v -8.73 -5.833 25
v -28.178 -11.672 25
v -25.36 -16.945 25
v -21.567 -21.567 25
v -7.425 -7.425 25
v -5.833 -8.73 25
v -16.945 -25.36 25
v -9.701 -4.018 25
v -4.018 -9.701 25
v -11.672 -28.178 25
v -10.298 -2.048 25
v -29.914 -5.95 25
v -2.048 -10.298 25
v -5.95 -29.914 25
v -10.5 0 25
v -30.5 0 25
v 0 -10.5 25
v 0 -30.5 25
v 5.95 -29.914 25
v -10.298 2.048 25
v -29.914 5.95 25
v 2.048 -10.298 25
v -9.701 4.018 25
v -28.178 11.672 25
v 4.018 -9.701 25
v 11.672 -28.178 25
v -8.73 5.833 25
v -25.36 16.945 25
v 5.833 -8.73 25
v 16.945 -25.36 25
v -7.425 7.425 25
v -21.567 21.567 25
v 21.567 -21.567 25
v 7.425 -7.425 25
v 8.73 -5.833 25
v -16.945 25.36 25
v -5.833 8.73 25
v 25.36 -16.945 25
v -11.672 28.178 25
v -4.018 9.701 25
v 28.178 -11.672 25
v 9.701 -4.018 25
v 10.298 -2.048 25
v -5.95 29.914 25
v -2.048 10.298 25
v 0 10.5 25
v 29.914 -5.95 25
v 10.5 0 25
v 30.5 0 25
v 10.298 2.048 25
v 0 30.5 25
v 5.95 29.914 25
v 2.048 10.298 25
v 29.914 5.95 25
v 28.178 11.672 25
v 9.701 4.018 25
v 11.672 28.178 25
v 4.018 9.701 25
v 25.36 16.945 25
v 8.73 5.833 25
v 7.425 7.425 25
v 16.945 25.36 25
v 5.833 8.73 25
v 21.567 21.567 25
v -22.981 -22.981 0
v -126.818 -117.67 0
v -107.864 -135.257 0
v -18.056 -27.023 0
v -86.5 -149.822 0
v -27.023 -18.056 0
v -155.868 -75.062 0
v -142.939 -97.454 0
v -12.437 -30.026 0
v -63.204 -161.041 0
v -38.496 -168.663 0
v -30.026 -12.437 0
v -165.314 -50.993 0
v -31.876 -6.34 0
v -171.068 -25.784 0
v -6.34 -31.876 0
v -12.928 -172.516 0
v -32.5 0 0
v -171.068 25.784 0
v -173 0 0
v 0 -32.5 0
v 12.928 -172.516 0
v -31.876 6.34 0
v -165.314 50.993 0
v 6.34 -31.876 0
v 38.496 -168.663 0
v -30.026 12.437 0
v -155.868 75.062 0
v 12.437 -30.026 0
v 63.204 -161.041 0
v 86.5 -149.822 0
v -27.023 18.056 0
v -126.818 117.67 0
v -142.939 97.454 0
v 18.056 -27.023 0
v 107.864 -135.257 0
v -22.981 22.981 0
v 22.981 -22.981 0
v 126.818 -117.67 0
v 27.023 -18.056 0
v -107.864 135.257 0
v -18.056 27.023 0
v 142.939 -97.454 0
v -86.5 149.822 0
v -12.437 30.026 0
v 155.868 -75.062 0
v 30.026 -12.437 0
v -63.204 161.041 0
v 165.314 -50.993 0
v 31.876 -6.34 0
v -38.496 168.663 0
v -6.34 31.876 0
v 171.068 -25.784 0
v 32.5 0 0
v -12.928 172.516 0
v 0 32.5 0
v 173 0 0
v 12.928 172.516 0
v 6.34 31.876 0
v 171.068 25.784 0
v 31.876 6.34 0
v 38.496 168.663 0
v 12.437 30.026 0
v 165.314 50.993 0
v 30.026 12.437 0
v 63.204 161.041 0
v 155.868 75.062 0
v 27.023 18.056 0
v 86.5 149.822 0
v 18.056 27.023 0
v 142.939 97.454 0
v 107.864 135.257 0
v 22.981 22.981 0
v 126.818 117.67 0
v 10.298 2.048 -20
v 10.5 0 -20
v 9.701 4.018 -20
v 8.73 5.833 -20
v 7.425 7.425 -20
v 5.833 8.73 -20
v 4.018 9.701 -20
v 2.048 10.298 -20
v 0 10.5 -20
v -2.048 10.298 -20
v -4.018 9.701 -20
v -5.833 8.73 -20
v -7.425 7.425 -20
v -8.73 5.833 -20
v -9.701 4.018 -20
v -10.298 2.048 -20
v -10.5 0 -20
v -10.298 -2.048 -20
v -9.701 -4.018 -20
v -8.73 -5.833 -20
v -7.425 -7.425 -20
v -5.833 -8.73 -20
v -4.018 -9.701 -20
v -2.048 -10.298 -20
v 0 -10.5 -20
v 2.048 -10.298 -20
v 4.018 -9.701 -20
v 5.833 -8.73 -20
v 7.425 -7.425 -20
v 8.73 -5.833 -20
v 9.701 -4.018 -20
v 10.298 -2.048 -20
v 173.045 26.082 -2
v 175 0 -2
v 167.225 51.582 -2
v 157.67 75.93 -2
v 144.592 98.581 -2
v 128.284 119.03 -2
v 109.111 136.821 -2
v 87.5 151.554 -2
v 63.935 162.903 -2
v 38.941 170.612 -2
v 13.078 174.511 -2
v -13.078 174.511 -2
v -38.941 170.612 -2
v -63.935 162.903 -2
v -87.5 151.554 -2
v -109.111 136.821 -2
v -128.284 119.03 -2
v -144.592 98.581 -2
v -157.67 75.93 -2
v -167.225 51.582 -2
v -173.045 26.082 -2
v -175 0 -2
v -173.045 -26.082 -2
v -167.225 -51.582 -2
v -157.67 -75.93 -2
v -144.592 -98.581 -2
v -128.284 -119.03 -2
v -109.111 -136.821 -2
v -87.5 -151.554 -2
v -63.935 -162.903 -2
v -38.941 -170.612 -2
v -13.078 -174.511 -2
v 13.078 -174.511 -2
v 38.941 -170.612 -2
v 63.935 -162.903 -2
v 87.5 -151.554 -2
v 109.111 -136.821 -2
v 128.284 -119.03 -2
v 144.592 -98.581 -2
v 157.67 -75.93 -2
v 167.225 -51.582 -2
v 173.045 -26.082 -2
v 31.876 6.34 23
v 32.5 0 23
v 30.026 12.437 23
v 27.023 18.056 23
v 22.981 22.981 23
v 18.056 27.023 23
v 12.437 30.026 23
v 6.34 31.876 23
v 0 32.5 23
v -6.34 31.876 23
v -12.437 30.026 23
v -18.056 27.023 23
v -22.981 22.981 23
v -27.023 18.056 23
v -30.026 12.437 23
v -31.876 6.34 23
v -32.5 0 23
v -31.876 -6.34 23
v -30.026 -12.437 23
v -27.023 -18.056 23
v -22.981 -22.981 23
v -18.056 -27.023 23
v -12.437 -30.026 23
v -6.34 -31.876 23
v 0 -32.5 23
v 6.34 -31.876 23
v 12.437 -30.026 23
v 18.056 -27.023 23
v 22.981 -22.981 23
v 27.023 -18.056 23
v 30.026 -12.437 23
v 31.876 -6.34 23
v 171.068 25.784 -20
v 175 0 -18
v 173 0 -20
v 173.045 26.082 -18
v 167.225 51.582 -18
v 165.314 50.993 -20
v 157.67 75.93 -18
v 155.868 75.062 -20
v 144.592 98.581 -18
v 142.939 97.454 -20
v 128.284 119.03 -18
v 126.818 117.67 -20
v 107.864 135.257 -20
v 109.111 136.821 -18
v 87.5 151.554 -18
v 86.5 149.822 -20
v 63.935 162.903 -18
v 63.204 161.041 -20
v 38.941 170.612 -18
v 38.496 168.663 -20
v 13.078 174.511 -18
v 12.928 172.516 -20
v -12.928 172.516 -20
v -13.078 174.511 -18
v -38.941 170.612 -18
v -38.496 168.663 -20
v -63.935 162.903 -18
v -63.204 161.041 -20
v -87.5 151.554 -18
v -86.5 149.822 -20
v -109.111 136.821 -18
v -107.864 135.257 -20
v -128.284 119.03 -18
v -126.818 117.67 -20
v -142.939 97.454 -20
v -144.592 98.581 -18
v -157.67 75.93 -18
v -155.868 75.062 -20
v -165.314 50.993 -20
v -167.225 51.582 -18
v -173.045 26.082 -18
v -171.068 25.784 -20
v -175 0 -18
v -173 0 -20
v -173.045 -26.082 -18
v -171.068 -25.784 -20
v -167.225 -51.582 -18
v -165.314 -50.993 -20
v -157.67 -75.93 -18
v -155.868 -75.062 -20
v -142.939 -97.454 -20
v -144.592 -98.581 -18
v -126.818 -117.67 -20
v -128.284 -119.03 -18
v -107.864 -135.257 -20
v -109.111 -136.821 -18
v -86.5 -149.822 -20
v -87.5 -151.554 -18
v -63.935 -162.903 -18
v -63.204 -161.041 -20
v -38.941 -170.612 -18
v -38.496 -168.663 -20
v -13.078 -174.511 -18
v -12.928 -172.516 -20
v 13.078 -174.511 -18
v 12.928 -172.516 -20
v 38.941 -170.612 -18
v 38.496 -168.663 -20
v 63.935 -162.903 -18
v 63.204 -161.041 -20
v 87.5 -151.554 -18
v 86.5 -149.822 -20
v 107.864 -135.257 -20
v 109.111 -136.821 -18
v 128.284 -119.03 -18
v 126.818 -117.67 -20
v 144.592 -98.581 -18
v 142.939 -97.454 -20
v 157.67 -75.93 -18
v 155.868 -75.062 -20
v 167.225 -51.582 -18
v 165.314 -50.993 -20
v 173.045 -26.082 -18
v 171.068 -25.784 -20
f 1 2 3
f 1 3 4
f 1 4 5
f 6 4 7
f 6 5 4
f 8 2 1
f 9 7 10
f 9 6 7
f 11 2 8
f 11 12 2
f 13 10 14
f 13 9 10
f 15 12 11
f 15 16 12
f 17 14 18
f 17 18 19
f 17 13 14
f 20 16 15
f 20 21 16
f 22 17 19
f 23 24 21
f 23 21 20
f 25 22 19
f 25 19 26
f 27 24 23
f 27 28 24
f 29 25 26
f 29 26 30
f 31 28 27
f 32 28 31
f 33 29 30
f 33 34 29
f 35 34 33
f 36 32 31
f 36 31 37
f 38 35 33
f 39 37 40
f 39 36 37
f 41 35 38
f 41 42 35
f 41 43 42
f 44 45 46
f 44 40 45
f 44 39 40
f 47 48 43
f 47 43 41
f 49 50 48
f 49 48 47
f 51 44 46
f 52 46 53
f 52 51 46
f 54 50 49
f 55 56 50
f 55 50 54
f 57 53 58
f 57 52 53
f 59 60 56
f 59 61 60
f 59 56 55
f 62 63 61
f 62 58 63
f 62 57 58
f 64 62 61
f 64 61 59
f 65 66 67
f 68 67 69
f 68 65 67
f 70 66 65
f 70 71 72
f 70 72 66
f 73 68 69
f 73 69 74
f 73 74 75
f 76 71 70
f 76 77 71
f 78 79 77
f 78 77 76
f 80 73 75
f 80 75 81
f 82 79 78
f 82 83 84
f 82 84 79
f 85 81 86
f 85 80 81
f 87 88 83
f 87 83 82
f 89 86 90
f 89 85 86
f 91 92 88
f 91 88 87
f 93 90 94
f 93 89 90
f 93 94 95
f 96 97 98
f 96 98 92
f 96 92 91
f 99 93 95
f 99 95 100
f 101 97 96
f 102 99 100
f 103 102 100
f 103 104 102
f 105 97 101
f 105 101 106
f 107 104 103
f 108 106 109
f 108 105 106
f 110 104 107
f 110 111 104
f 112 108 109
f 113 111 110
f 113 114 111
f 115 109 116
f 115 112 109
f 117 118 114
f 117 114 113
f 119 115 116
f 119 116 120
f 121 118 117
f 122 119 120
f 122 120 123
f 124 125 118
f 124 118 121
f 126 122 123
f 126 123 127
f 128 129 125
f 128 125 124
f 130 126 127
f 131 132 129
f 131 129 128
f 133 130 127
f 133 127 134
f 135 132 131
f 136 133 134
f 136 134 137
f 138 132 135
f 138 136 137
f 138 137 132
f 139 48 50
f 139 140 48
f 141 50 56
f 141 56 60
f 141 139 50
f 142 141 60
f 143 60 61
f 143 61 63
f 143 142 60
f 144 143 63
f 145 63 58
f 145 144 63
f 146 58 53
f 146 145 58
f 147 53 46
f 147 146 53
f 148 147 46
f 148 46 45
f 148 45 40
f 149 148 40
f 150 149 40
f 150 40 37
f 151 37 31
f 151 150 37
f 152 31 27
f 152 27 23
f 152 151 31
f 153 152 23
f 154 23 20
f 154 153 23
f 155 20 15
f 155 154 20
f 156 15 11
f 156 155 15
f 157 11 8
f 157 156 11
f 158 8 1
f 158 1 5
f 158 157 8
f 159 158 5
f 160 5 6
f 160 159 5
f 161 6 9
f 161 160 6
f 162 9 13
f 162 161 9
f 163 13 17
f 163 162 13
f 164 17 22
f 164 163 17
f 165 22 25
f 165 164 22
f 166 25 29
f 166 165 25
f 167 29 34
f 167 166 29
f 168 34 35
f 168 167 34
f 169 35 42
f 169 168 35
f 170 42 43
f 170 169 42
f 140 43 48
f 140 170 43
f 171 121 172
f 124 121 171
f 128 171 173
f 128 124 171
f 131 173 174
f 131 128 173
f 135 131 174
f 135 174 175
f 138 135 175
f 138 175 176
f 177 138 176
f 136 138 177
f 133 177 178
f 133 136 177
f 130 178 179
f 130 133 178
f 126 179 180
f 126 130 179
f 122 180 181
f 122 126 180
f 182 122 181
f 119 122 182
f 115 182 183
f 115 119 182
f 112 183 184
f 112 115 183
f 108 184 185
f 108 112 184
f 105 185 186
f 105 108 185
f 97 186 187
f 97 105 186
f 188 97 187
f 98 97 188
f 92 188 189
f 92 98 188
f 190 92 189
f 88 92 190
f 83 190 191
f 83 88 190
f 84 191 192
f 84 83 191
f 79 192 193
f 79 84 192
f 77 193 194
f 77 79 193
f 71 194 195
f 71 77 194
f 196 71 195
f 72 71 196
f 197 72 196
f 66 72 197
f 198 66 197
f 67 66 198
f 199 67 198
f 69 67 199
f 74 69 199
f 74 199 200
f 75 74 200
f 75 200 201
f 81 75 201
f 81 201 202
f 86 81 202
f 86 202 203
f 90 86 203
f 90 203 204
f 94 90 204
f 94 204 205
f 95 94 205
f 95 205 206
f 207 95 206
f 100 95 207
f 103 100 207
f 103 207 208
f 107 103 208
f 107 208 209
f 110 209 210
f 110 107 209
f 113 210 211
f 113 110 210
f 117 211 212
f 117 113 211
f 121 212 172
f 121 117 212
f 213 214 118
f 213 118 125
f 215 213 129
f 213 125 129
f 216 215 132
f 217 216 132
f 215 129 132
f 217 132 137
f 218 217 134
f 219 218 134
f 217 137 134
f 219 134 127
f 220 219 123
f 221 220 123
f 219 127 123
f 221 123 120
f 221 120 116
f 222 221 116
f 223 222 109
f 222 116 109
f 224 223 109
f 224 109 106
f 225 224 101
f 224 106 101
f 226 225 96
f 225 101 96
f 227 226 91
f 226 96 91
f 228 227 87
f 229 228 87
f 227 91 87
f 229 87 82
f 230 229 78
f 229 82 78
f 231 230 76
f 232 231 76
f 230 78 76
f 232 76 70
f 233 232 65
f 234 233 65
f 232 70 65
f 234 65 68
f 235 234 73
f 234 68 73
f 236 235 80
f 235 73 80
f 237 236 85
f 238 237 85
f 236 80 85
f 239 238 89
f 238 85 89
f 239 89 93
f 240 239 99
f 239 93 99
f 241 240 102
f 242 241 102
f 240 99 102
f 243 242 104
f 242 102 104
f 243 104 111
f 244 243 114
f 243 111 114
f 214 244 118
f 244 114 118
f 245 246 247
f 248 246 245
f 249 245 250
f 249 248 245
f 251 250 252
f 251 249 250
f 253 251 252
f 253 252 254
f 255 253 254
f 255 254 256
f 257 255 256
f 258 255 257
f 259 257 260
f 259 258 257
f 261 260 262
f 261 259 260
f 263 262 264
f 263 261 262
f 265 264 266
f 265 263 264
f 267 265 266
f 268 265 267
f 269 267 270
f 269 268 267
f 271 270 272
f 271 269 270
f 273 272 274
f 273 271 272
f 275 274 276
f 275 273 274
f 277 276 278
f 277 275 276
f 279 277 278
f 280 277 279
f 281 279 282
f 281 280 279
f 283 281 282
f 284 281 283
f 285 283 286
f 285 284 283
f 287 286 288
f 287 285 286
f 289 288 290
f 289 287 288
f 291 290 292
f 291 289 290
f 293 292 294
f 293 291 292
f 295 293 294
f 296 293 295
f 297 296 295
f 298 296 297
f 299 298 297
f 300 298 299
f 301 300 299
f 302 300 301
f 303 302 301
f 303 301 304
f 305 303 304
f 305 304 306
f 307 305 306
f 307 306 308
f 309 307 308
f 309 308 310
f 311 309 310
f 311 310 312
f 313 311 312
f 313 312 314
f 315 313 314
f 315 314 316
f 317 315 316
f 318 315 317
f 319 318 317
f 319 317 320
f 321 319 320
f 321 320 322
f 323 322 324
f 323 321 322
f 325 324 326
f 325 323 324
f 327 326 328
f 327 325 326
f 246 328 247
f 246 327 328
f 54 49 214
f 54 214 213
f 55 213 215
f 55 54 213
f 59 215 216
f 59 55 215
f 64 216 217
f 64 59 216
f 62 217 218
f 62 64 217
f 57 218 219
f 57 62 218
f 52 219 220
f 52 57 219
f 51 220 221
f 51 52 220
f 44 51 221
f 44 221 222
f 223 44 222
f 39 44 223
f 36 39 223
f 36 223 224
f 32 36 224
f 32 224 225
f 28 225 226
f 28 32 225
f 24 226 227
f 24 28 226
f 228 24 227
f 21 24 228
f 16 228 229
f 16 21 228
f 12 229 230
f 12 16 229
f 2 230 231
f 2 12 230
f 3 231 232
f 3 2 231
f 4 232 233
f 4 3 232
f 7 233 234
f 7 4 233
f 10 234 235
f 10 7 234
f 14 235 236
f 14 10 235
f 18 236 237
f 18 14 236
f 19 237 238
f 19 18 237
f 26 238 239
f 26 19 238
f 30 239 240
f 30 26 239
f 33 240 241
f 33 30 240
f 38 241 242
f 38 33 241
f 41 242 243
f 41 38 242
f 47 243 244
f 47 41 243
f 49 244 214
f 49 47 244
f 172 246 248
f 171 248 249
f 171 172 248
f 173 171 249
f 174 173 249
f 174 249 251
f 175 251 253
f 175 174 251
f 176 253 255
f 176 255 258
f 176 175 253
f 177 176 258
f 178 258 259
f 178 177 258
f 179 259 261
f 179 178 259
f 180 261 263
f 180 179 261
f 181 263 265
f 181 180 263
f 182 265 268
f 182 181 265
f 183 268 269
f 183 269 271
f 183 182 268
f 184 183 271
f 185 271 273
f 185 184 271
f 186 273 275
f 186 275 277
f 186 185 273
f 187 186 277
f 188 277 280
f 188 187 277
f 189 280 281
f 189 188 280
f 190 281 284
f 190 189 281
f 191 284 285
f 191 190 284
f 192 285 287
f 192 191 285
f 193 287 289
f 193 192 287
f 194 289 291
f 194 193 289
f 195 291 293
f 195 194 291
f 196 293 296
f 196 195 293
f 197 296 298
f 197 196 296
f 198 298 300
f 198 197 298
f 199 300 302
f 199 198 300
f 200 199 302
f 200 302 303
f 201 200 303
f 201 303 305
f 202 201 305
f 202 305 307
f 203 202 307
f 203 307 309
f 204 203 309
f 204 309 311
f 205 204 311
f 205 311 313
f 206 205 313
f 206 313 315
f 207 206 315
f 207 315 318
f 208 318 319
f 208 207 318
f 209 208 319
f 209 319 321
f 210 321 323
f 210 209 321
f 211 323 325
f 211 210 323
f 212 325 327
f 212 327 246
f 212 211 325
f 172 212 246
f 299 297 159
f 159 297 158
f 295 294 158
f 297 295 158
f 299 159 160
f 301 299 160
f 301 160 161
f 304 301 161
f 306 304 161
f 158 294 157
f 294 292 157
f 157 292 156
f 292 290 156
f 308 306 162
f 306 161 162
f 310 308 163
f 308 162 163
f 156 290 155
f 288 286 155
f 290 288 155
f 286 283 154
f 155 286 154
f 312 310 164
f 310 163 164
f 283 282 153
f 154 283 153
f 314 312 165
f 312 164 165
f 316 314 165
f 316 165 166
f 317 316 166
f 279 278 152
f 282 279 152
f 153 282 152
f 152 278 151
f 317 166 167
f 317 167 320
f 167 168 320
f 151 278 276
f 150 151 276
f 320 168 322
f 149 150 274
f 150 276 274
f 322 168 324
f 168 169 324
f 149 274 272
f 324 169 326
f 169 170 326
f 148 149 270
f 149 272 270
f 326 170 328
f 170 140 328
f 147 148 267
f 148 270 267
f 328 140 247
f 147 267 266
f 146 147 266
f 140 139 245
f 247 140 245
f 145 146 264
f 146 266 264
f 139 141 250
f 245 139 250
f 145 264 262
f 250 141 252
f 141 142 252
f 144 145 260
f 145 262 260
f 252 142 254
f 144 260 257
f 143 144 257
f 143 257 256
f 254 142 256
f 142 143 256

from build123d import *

# Parameters (mm, degrees)
F0_R     = 175
F0_R_2   = 32.5
F0_R_3   = 10.5
F1_DEPTH = 20
F2_DEPTH = 25
F3_SIZE  = 2


with BuildPart() as f1:
    # F0 (on Top) → F1 (new body)
    with BuildSketch(Plane.XY):
        Circle(F0_R)
        Circle(F0_R_2, mode=Mode.SUBTRACT)
        Circle(F0_R_2)
        Circle(F0_R_3, mode=Mode.SUBTRACT)
    extrude(amount=-F1_DEPTH)

    # F0 (on Top) → F2 (join)
    with BuildSketch(Plane.XY):
        Circle(F0_R_2)
        Circle(F0_R_3, mode=Mode.SUBTRACT)
    extrude(amount=F2_DEPTH)

    # F3
    f3_edges = [f1.edges().sort_by_distance(p)[0] for p in [
        (-175, 0, 0),
        (-175, 0, -20),
        (-32.5, 0, 25),
    ]]
    chamfer(f3_edges, length=F3_SIZE)


solid = f1.part
